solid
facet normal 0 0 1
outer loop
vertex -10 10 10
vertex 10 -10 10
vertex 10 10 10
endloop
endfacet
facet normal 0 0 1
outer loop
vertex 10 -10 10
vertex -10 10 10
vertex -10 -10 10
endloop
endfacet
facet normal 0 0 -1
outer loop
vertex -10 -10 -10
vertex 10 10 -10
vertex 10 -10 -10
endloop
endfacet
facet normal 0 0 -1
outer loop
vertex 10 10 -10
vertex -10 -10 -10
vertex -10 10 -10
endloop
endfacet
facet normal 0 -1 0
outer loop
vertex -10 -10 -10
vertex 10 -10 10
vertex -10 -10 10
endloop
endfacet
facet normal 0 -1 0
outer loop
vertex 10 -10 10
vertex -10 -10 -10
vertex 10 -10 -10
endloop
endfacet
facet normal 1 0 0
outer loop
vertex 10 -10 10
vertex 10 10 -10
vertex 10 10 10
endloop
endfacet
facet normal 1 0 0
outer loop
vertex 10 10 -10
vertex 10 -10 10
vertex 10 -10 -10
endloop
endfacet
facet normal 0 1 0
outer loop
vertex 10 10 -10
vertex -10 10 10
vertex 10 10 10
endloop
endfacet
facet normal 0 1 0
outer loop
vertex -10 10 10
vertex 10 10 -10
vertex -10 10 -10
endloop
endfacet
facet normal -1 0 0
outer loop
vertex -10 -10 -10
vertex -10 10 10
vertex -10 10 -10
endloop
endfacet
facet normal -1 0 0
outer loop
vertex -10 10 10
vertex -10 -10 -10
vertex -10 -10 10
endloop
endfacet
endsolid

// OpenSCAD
// Simple cube test
cube([20, 20, 20], center=true);

// Optional: Add a cylinder
// cylinder(h=30, r=10, center=true);
